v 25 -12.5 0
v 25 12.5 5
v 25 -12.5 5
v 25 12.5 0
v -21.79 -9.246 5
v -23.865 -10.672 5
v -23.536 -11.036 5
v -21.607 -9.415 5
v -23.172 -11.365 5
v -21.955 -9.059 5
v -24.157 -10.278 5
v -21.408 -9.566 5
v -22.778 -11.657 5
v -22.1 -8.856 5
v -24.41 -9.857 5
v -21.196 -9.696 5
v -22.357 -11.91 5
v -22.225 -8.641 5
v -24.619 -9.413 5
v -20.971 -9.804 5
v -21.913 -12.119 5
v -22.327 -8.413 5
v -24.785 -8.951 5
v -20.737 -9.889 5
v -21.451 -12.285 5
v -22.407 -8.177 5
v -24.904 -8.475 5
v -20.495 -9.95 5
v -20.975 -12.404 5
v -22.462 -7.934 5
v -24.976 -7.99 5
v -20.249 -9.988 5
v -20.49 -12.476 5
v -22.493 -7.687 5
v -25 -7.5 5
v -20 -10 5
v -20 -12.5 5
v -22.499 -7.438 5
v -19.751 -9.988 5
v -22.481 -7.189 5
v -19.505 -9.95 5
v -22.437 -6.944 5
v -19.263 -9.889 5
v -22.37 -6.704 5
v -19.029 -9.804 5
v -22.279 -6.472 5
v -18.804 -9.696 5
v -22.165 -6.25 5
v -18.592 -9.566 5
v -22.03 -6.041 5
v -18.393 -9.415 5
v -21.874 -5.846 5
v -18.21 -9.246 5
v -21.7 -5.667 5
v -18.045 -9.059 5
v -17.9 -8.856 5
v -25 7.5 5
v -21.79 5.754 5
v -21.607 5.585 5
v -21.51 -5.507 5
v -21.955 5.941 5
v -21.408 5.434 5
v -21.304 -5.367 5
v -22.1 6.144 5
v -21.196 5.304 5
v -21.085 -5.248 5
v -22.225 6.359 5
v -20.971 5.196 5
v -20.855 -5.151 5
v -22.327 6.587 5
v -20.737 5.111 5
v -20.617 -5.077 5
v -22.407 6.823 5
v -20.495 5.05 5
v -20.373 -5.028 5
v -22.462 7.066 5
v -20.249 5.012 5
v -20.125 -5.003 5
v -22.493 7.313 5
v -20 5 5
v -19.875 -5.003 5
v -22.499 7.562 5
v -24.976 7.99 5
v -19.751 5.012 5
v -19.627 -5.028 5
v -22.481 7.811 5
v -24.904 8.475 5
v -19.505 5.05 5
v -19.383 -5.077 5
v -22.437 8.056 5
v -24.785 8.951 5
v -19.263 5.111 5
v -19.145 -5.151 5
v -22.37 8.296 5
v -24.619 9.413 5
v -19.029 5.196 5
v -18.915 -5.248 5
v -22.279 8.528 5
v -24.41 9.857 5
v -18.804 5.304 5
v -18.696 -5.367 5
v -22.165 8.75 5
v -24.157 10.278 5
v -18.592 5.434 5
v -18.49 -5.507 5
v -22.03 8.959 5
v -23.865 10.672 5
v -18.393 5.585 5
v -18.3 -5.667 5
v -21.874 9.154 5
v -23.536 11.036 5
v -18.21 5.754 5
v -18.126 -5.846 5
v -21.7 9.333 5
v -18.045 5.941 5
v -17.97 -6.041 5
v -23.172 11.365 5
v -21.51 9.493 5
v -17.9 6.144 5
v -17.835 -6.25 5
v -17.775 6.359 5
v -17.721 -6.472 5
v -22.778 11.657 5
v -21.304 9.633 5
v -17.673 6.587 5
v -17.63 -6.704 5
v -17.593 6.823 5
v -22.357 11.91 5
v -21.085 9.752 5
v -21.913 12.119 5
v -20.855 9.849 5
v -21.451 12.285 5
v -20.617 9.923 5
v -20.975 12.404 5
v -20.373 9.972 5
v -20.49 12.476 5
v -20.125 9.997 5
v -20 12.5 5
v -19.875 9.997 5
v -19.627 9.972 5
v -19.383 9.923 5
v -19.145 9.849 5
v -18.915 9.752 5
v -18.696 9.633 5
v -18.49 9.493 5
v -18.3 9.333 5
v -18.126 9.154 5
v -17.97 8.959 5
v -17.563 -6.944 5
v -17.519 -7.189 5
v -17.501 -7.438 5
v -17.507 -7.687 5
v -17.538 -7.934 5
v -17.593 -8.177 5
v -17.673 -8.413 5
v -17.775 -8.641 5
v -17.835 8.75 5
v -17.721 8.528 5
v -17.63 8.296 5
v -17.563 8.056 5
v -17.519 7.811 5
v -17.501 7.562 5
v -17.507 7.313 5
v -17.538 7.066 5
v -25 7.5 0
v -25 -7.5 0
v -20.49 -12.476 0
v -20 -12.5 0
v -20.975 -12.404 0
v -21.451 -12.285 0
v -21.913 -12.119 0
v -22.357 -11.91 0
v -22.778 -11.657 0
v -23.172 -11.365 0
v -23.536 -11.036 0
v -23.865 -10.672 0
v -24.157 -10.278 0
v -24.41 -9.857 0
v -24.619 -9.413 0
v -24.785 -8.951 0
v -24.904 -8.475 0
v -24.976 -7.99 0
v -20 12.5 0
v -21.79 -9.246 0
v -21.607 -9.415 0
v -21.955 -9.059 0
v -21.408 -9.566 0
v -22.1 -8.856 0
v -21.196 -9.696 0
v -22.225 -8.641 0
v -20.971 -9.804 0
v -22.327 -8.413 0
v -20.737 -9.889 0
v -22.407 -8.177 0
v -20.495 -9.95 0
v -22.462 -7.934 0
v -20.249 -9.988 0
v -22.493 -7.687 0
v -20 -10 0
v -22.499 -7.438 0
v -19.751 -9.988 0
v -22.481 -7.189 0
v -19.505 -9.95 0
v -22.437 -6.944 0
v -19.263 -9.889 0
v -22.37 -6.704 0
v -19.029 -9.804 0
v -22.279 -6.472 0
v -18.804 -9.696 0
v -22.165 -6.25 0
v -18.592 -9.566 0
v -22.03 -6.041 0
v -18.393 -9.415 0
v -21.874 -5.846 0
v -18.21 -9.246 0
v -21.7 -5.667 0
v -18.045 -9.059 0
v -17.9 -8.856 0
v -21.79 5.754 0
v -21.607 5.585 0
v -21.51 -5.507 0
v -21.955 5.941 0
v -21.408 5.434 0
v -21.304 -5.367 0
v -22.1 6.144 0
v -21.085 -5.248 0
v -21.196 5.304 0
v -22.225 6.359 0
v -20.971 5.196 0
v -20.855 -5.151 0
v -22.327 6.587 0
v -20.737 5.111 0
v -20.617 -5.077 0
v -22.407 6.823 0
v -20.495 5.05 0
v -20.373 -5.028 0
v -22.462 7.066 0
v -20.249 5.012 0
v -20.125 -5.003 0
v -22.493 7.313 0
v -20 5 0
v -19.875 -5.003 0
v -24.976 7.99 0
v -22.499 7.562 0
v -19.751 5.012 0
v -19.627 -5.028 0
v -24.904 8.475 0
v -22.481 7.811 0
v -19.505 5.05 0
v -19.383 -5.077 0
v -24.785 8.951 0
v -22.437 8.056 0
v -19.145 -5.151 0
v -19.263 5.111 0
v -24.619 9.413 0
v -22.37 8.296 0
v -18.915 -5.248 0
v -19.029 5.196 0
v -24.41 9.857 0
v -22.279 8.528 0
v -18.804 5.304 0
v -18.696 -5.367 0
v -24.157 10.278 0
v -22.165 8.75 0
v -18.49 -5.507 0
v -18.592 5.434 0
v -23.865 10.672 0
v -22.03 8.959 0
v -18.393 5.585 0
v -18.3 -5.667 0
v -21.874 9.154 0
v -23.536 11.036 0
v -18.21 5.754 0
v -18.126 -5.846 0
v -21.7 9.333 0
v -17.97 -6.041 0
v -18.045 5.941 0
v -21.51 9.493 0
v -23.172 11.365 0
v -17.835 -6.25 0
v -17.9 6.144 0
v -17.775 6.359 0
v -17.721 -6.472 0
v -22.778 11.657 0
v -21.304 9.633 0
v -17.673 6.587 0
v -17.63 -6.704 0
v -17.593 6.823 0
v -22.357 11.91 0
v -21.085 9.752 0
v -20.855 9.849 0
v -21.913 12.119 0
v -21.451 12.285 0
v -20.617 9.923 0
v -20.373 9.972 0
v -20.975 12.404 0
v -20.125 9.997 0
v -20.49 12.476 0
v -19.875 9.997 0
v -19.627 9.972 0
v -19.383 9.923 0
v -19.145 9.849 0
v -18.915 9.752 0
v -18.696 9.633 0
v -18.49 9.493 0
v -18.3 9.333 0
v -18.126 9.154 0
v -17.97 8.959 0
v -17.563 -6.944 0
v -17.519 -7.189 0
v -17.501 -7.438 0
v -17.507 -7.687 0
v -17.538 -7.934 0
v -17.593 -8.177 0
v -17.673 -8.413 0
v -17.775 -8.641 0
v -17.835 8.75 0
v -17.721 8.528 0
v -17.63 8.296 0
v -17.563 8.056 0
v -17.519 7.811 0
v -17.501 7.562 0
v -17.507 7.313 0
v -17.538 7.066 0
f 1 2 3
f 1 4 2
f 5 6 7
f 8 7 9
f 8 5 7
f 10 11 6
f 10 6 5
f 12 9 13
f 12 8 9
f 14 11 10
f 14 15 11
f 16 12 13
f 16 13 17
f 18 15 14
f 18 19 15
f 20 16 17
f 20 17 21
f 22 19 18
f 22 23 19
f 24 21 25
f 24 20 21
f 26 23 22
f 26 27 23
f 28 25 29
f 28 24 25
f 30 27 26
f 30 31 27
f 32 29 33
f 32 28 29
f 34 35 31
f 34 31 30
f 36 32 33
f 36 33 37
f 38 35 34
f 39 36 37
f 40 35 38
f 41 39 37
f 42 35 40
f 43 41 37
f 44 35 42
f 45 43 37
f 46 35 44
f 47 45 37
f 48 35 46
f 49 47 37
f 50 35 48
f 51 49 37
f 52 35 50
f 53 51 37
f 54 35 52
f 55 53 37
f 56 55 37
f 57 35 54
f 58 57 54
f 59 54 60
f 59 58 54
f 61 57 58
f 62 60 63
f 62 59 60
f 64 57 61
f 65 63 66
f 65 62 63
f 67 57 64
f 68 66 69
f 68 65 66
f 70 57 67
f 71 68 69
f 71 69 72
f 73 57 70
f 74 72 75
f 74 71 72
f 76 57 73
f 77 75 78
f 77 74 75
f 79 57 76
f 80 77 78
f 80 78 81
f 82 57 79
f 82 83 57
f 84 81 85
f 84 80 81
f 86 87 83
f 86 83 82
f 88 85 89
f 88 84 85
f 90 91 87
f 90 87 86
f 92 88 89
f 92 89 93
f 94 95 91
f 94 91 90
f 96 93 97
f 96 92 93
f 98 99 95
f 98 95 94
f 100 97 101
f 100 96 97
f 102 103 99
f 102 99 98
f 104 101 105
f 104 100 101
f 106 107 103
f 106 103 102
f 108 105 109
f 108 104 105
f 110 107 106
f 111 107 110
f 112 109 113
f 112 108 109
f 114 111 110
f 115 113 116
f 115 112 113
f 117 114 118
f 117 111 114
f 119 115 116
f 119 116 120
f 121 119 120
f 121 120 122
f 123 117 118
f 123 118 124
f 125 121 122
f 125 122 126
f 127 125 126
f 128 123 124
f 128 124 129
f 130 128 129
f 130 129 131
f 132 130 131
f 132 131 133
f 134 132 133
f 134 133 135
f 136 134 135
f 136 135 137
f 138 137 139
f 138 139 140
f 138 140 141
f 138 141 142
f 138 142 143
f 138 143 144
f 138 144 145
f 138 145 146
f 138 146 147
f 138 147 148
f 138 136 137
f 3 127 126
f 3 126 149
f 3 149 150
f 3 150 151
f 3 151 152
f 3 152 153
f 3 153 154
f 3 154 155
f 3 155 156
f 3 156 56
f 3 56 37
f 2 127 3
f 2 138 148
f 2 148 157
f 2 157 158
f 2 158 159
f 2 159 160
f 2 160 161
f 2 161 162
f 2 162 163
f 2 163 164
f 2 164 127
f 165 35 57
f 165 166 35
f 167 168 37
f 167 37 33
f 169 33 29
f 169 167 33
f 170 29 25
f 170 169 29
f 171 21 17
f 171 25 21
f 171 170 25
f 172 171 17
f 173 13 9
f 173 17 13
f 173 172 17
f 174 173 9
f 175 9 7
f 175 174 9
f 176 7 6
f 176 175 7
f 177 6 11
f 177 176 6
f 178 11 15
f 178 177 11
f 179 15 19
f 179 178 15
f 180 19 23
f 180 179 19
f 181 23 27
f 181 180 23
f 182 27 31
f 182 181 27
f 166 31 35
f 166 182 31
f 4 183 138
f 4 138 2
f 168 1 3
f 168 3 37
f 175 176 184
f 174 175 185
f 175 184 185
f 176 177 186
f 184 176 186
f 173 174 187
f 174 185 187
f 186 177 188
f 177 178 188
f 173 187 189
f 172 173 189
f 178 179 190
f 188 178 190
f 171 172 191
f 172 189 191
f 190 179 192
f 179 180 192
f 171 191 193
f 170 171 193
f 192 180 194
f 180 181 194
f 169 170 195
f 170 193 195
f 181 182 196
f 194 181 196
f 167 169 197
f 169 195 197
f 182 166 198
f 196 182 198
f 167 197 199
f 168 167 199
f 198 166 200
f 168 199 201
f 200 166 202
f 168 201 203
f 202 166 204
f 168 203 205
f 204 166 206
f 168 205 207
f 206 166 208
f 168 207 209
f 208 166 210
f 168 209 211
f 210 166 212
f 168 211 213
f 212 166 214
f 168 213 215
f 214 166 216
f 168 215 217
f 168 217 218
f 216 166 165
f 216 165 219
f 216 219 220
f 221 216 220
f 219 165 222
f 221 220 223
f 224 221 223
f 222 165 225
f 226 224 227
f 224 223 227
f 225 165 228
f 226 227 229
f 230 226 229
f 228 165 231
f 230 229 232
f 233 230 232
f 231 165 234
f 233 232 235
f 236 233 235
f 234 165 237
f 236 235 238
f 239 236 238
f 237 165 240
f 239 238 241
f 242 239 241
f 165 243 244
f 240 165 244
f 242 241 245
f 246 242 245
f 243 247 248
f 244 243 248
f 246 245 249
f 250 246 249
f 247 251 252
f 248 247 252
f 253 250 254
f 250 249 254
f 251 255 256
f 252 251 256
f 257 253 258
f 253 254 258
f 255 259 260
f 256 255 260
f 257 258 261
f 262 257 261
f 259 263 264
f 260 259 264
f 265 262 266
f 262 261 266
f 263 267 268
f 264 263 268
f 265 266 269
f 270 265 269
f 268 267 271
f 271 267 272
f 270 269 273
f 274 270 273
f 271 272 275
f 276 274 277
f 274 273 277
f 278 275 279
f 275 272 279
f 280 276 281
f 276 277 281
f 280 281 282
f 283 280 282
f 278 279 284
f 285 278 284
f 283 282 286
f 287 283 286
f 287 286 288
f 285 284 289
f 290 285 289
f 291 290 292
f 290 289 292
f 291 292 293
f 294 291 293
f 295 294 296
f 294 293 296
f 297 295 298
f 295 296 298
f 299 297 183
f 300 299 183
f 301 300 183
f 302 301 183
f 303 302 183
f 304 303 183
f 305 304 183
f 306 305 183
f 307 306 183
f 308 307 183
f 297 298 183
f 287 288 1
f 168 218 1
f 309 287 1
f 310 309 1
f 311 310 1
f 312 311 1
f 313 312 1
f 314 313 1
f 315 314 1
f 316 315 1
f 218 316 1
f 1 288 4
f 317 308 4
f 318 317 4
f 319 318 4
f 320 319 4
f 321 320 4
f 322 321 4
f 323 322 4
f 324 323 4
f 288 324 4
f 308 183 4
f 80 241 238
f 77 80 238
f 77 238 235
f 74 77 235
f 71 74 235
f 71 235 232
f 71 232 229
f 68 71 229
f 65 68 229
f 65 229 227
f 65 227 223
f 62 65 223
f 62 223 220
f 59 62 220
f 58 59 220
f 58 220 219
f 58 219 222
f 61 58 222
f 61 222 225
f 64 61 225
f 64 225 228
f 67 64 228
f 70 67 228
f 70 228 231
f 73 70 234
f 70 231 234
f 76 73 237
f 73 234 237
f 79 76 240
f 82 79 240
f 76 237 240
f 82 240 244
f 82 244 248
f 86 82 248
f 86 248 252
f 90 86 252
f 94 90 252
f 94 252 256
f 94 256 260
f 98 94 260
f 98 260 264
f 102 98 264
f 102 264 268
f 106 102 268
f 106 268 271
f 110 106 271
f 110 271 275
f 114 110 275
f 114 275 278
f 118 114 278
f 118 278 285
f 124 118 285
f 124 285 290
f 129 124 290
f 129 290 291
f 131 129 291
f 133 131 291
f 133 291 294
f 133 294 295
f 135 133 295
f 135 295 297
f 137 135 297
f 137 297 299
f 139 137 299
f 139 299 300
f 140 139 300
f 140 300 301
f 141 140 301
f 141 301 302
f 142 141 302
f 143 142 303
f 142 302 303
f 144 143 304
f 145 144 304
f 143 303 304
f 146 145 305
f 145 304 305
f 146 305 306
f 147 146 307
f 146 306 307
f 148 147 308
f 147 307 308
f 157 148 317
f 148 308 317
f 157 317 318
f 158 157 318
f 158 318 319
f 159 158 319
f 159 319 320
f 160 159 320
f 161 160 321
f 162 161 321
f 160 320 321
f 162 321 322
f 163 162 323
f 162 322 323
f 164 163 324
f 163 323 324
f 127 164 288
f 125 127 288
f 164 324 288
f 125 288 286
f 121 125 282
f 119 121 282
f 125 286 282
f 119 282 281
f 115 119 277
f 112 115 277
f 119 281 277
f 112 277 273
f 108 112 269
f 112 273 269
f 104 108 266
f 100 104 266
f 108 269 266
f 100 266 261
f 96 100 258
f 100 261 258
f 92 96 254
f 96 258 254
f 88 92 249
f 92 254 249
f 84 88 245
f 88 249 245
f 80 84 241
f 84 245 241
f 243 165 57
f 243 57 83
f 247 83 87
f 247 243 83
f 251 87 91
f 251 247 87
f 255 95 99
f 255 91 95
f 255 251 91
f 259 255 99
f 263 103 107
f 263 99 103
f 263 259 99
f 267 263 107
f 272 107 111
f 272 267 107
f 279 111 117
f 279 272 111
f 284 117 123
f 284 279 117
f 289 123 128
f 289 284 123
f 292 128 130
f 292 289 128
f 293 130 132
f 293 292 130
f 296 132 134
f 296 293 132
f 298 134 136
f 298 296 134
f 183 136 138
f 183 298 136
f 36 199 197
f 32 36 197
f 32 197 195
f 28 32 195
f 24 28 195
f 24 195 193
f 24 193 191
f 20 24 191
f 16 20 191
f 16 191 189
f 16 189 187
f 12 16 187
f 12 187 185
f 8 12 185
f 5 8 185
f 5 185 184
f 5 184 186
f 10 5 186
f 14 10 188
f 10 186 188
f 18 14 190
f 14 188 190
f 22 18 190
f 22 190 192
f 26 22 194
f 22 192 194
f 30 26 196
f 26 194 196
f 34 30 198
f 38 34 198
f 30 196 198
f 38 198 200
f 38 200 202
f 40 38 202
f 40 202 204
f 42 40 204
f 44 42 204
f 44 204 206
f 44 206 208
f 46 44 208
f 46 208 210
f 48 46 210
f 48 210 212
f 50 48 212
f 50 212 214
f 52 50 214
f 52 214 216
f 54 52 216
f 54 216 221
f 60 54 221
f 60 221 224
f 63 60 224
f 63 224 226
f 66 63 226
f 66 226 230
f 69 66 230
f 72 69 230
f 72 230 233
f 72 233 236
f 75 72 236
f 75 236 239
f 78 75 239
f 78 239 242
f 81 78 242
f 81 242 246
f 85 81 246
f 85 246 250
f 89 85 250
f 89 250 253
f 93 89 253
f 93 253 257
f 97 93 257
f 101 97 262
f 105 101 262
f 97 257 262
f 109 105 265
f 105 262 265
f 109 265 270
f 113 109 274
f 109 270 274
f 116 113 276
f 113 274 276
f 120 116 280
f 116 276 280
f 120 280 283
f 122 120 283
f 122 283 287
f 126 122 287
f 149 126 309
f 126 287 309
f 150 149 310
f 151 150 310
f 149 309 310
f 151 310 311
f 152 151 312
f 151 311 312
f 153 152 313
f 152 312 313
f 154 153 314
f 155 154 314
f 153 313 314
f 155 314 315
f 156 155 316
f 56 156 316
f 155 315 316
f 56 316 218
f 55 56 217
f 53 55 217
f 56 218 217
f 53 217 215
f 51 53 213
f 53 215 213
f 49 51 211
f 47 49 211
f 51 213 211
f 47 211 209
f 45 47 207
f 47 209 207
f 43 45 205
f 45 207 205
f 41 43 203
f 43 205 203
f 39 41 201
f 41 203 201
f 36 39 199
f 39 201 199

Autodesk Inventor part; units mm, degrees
ref_plane "YZ Plane" through (0, 0, 0) normal (1, 0, 0) x (0, 1, 0)
ref_plane "XZ Plane" through (0, 0, 0) normal (0, 1, 0) x (-1, 0, 0)
ref_plane "XY Plane" through (0, 0, 0) normal (0, 0, 1) x (1, 0, 0)
sketch "Sketch1" plane through (0, 0, 0) normal (0, 0, 1) x (1, 0, 0)
  line L0 (-20, 12.5) -> (25, 12.5)
  line L1 (25, 12.5) -> (25, -12.5)
  line L2 (25, -12.5) -> (-20, -12.5)
  line L3 (-25, -7.5) -> (-25, 7.5)
  arc A0 (-20, 12.5) -> (-25, 7.5) centre (-20, 7.5) ccw
  arc A1 (-25, -7.5) -> (-20, -12.5) centre (-20, -7.5) ccw
  point P0 (0, 0)
  point P1 (-25, 12.5)
  point P2 (-25, -12.5)
  dimension "d0" = 25
  dimension "d1" = 50
  dimension "d2" = 5
  dimension "d5" = 12.5
  dimension "d6" = 25
extrude "Extrusion1" add sketch "Sketch1" along normal blind 5
sketch "Sketch2" plane through (0, 0, 5) normal (0, 0, 1) x (1, 0, 0)
  arc A0 (-20, 12.5) -> (-25, 7.5) centre (-20, 7.5) ccw projected
  arc A1 (-25, -7.5) -> (-20, -12.5) centre (-20, -7.5) ccw projected
  point P0 (0, 0)
hole "Hole1" at (-20, 7.5, 5) at (-20, -7.5, 5) direction (0, 0, -1) diameter 5 end through all
properties part number "DedoV2" material "MDF Medium Density Fiberboard"
